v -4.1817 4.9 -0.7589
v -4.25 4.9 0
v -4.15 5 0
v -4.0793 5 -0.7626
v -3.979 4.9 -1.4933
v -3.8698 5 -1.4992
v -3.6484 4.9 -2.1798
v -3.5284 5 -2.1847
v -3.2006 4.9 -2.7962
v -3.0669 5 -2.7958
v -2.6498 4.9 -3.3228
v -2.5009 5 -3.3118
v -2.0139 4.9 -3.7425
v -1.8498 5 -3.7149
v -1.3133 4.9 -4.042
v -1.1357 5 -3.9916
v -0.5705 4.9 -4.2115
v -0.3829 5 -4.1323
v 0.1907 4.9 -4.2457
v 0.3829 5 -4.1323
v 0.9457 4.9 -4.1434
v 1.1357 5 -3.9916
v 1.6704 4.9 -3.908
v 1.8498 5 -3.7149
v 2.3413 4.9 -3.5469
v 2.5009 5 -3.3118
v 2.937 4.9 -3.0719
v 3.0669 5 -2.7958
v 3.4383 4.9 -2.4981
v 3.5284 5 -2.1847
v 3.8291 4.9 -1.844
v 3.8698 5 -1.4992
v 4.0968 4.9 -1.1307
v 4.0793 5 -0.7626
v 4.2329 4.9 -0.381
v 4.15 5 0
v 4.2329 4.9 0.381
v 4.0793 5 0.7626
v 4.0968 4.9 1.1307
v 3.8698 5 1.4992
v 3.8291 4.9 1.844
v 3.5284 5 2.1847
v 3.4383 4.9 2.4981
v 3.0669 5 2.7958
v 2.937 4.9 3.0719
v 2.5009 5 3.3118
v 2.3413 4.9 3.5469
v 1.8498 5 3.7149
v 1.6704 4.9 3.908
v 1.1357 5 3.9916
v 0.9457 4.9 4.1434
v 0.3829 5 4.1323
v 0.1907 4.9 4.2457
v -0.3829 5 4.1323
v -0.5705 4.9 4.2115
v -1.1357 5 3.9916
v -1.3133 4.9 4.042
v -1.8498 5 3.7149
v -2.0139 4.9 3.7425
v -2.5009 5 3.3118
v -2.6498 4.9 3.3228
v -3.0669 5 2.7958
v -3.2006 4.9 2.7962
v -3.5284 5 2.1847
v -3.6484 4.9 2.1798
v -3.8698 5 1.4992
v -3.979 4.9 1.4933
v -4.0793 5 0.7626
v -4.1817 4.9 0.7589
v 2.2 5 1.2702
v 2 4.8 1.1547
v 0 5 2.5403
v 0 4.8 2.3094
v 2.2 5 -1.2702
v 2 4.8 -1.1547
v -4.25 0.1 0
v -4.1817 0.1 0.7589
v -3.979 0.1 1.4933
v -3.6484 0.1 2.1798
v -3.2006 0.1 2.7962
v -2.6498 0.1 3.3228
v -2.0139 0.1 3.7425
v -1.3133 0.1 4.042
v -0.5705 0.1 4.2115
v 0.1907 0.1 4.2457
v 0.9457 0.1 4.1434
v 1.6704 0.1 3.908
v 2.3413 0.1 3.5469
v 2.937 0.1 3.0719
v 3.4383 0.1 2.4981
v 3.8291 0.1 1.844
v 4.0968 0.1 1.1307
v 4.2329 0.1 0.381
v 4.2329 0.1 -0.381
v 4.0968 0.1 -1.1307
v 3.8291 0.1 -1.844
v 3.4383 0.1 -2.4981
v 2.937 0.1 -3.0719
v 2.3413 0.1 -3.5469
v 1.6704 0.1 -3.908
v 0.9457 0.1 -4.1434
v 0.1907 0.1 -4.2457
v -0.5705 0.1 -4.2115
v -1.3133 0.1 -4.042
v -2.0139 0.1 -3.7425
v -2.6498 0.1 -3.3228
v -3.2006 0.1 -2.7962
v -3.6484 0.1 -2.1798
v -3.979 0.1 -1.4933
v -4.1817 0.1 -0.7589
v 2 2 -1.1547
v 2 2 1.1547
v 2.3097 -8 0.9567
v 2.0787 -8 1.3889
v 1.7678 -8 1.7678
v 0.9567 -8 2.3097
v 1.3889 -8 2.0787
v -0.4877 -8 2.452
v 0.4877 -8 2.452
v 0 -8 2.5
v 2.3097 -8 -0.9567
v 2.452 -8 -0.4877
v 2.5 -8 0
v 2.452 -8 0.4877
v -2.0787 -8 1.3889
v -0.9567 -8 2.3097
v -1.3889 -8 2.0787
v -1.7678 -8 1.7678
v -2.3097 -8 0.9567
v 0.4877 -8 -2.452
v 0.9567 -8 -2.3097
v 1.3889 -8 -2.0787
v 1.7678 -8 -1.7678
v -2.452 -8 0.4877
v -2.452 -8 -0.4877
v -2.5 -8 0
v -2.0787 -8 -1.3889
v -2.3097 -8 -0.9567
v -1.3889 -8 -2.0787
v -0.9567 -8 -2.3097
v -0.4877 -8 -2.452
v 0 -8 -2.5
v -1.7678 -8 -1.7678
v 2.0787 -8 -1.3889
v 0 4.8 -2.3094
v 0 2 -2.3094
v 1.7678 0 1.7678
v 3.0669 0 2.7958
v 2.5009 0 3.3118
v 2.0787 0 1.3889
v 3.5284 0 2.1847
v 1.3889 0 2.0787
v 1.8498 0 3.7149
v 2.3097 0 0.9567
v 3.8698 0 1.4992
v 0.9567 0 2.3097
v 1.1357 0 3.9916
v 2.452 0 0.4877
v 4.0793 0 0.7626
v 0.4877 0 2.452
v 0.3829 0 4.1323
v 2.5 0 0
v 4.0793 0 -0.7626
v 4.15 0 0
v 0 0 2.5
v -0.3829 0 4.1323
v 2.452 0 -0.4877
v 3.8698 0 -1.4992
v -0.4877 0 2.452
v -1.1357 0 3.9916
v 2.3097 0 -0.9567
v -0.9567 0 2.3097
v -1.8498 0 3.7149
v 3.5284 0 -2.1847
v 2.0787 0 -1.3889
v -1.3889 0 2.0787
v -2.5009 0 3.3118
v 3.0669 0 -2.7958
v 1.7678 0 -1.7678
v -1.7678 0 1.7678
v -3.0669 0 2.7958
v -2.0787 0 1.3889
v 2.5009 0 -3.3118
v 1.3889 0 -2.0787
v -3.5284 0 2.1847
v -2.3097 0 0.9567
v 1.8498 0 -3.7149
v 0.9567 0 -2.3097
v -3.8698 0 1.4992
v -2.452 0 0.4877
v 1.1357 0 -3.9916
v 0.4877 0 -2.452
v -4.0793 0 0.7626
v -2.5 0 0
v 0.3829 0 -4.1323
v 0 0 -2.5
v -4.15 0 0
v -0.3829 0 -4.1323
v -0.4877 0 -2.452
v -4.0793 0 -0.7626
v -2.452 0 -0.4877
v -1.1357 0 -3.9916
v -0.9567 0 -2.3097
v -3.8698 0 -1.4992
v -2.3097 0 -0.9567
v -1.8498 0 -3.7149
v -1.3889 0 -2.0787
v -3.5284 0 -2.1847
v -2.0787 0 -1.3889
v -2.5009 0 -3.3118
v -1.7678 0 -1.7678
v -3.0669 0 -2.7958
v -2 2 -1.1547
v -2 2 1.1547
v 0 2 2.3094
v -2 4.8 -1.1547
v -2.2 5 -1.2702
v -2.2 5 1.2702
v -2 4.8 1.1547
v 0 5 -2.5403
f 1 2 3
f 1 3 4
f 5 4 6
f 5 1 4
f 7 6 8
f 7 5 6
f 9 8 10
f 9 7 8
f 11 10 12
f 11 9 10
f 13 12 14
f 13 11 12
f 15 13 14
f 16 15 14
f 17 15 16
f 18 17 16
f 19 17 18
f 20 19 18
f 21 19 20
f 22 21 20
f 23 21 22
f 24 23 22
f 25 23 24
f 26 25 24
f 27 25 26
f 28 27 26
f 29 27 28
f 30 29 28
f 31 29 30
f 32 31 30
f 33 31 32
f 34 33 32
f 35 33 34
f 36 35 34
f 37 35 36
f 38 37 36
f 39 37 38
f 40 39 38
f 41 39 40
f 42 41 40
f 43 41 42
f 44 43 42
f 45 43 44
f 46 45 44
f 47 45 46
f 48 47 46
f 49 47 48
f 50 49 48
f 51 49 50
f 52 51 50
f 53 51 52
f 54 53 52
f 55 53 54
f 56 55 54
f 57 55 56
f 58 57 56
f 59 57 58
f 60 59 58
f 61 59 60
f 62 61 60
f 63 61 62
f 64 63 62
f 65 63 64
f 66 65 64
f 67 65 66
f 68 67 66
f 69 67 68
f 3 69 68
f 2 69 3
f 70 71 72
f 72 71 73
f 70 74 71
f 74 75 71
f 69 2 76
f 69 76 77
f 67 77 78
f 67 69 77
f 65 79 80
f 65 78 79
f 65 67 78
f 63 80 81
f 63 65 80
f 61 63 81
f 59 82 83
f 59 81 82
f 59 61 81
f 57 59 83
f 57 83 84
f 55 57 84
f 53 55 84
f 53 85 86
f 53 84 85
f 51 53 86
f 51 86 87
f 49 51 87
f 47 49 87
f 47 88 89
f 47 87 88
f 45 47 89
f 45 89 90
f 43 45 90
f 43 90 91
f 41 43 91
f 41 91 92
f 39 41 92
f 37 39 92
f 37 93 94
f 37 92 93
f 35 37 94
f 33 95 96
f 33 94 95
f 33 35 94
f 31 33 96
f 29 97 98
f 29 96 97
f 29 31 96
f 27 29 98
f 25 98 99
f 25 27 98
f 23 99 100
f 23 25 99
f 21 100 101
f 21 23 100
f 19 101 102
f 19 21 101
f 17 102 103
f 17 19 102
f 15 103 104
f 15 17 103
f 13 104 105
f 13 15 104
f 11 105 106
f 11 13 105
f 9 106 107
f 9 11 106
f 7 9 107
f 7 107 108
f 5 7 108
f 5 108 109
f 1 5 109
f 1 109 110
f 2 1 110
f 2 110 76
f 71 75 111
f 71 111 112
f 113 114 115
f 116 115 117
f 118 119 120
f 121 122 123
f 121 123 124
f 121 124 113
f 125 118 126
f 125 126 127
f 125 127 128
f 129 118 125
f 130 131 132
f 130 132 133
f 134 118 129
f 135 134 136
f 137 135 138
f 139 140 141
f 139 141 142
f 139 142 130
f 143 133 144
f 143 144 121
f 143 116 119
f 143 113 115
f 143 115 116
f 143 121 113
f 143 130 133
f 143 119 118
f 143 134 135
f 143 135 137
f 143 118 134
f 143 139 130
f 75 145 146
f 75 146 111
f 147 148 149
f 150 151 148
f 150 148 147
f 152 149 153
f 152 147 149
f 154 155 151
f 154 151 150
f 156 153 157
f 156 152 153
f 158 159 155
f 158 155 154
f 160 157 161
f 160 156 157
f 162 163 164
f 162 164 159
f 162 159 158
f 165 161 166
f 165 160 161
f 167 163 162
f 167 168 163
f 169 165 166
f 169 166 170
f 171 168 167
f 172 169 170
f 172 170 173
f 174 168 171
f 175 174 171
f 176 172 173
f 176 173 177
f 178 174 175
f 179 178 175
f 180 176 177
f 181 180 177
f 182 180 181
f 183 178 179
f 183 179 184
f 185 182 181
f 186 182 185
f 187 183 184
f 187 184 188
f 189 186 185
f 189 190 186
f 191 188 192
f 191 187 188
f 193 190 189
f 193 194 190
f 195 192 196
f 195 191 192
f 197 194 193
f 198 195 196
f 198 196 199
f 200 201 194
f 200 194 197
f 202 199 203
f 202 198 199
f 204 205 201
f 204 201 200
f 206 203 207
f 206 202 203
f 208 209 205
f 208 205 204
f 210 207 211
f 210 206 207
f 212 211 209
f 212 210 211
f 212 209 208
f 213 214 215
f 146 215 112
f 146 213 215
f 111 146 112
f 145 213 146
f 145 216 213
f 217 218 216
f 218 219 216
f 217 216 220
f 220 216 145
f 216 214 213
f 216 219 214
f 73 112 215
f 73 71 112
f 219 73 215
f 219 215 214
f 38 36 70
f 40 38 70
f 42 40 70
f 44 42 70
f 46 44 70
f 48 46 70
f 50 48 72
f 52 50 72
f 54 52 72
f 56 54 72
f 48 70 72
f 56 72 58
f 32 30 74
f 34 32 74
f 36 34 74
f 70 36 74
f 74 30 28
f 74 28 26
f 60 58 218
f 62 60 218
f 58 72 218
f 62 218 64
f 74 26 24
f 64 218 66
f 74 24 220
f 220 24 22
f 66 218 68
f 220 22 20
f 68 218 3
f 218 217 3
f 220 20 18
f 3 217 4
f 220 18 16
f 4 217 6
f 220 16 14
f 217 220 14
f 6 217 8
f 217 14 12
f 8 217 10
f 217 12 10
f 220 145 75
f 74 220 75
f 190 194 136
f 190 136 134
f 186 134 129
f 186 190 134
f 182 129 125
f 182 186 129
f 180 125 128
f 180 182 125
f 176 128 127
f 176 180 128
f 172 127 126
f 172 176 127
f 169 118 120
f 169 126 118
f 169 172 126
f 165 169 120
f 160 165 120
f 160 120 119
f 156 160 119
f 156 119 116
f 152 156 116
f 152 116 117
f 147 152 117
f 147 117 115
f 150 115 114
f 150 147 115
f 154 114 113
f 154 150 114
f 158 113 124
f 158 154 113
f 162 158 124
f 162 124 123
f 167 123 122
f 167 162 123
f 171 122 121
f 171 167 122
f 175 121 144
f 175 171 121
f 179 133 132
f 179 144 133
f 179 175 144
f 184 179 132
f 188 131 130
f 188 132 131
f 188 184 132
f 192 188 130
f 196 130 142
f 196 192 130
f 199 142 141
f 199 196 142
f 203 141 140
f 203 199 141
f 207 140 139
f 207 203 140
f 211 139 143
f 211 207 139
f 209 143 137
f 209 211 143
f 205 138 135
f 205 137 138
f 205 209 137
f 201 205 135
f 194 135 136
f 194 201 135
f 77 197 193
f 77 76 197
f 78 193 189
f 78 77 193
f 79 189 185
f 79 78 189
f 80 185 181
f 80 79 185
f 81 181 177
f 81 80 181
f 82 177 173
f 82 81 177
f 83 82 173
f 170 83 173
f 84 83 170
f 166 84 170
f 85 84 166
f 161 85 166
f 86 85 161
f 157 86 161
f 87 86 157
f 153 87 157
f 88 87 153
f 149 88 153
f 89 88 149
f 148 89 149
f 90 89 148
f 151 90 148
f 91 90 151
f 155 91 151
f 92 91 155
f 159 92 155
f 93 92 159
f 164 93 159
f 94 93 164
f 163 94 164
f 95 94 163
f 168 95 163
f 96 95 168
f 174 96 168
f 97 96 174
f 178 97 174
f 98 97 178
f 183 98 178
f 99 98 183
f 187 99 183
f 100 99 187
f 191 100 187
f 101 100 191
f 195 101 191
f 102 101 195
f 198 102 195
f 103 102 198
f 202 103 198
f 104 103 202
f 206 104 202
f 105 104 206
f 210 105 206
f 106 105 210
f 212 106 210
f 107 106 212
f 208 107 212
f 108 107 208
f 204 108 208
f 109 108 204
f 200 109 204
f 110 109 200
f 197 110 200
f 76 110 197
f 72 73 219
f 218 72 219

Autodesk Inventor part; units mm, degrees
ref_plane "YZ Plane" through (0, 0, 0) normal (1, 0, 0) x (0, 1, 0)
ref_plane "XZ Plane" through (0, 0, 0) normal (0, 1, 0) x (-1, 0, 0)
ref_plane "XY Plane" through (0, 0, 0) normal (0, 0, 1) x (1, 0, 0)
sketch "スケッチ1" plane through (0, 0, 0) normal (0, 0, 1) x (1, 0, 0)
  line L0 (-4.25, 5) -> (0, 5)
  line L1 (4.25, 5) -> (4.25, 0)
  line L2 (4.25, 0) -> (-4.25, 0)
  line L3 (-4.25, 0) -> (-4.25, 5)
  line L4 (-2.5, 0) -> (0, 0)
  line L5 (2.5, 0) -> (2.5, -8)
  line L6 (2.5, -8) -> (0, -8)
  line L7 (-2.5, -8) -> (-2.5, 0)
  line L8 (0, 5) -> (0, -8)
  line L9 (0, 5) -> (4.25, 5)
  line L10 (0, 0) -> (2.5, 0)
  line L11 (0, -8) -> (-2.5, -8)
  point P0 (0, 0)
  dimension "d0" = 5
  dimension "d1" = 2.5
  dimension "d2" = 8
  dimension "d3" = 8.5
  dimension "d4" = 4.25
  dimension "d5" = 5
  dimension "d18" = 5
revolve "回転1" add sketch "スケッチ1" angle 360 about axis through (0, 5, 0) along (0, -1, 0) contours L0 L8 L2 L3 | L8 L11 L7 L2
sketch "スケッチ2" plane through (0, 5, 0) normal (0, 1, 0) x (1, 0, 0)
  line L0 (0, 2.3094) -> (2, 1.1547)
  line L1 (2, 1.1547) -> (2, -1.1547)
  line L2 (2, -1.1547) -> (0, -2.3094)
  line L3 (0, -2.3094) -> (-2, -1.1547)
  line L4 (-2, -1.1547) -> (-2, 1.1547)
  line L5 (-2, 1.1547) -> (0, 2.3094)
  point P0 (0, 0)
  dimension "d9" = 4
extrude "押し出し1" cut sketch "スケッチ2" against normal blind 3
chamfer "面取り1" distance 0.1 angle 45 2 edges at (4.25, 5, 0) (4.25, 0, 0)
chamfer "面取り2" distance 0.2 angle 45 6 edges at (1, 5, 1.7321) (-1, 5, 1.7321) (-2, 5, 0) (-1, 5, -1.7321) (1, 5, -1.7321) (2, 5, 0)
thread "ねじ2" size "M5x0.8" class "6g" standard "ANSI Metric M Profile" full length
equation "\"d1\" = 0.5 * d0"
equation "\"d4\" = 0.5 * d3"
equation "\"d18\" = d0"
properties part number "M5_8mm"
